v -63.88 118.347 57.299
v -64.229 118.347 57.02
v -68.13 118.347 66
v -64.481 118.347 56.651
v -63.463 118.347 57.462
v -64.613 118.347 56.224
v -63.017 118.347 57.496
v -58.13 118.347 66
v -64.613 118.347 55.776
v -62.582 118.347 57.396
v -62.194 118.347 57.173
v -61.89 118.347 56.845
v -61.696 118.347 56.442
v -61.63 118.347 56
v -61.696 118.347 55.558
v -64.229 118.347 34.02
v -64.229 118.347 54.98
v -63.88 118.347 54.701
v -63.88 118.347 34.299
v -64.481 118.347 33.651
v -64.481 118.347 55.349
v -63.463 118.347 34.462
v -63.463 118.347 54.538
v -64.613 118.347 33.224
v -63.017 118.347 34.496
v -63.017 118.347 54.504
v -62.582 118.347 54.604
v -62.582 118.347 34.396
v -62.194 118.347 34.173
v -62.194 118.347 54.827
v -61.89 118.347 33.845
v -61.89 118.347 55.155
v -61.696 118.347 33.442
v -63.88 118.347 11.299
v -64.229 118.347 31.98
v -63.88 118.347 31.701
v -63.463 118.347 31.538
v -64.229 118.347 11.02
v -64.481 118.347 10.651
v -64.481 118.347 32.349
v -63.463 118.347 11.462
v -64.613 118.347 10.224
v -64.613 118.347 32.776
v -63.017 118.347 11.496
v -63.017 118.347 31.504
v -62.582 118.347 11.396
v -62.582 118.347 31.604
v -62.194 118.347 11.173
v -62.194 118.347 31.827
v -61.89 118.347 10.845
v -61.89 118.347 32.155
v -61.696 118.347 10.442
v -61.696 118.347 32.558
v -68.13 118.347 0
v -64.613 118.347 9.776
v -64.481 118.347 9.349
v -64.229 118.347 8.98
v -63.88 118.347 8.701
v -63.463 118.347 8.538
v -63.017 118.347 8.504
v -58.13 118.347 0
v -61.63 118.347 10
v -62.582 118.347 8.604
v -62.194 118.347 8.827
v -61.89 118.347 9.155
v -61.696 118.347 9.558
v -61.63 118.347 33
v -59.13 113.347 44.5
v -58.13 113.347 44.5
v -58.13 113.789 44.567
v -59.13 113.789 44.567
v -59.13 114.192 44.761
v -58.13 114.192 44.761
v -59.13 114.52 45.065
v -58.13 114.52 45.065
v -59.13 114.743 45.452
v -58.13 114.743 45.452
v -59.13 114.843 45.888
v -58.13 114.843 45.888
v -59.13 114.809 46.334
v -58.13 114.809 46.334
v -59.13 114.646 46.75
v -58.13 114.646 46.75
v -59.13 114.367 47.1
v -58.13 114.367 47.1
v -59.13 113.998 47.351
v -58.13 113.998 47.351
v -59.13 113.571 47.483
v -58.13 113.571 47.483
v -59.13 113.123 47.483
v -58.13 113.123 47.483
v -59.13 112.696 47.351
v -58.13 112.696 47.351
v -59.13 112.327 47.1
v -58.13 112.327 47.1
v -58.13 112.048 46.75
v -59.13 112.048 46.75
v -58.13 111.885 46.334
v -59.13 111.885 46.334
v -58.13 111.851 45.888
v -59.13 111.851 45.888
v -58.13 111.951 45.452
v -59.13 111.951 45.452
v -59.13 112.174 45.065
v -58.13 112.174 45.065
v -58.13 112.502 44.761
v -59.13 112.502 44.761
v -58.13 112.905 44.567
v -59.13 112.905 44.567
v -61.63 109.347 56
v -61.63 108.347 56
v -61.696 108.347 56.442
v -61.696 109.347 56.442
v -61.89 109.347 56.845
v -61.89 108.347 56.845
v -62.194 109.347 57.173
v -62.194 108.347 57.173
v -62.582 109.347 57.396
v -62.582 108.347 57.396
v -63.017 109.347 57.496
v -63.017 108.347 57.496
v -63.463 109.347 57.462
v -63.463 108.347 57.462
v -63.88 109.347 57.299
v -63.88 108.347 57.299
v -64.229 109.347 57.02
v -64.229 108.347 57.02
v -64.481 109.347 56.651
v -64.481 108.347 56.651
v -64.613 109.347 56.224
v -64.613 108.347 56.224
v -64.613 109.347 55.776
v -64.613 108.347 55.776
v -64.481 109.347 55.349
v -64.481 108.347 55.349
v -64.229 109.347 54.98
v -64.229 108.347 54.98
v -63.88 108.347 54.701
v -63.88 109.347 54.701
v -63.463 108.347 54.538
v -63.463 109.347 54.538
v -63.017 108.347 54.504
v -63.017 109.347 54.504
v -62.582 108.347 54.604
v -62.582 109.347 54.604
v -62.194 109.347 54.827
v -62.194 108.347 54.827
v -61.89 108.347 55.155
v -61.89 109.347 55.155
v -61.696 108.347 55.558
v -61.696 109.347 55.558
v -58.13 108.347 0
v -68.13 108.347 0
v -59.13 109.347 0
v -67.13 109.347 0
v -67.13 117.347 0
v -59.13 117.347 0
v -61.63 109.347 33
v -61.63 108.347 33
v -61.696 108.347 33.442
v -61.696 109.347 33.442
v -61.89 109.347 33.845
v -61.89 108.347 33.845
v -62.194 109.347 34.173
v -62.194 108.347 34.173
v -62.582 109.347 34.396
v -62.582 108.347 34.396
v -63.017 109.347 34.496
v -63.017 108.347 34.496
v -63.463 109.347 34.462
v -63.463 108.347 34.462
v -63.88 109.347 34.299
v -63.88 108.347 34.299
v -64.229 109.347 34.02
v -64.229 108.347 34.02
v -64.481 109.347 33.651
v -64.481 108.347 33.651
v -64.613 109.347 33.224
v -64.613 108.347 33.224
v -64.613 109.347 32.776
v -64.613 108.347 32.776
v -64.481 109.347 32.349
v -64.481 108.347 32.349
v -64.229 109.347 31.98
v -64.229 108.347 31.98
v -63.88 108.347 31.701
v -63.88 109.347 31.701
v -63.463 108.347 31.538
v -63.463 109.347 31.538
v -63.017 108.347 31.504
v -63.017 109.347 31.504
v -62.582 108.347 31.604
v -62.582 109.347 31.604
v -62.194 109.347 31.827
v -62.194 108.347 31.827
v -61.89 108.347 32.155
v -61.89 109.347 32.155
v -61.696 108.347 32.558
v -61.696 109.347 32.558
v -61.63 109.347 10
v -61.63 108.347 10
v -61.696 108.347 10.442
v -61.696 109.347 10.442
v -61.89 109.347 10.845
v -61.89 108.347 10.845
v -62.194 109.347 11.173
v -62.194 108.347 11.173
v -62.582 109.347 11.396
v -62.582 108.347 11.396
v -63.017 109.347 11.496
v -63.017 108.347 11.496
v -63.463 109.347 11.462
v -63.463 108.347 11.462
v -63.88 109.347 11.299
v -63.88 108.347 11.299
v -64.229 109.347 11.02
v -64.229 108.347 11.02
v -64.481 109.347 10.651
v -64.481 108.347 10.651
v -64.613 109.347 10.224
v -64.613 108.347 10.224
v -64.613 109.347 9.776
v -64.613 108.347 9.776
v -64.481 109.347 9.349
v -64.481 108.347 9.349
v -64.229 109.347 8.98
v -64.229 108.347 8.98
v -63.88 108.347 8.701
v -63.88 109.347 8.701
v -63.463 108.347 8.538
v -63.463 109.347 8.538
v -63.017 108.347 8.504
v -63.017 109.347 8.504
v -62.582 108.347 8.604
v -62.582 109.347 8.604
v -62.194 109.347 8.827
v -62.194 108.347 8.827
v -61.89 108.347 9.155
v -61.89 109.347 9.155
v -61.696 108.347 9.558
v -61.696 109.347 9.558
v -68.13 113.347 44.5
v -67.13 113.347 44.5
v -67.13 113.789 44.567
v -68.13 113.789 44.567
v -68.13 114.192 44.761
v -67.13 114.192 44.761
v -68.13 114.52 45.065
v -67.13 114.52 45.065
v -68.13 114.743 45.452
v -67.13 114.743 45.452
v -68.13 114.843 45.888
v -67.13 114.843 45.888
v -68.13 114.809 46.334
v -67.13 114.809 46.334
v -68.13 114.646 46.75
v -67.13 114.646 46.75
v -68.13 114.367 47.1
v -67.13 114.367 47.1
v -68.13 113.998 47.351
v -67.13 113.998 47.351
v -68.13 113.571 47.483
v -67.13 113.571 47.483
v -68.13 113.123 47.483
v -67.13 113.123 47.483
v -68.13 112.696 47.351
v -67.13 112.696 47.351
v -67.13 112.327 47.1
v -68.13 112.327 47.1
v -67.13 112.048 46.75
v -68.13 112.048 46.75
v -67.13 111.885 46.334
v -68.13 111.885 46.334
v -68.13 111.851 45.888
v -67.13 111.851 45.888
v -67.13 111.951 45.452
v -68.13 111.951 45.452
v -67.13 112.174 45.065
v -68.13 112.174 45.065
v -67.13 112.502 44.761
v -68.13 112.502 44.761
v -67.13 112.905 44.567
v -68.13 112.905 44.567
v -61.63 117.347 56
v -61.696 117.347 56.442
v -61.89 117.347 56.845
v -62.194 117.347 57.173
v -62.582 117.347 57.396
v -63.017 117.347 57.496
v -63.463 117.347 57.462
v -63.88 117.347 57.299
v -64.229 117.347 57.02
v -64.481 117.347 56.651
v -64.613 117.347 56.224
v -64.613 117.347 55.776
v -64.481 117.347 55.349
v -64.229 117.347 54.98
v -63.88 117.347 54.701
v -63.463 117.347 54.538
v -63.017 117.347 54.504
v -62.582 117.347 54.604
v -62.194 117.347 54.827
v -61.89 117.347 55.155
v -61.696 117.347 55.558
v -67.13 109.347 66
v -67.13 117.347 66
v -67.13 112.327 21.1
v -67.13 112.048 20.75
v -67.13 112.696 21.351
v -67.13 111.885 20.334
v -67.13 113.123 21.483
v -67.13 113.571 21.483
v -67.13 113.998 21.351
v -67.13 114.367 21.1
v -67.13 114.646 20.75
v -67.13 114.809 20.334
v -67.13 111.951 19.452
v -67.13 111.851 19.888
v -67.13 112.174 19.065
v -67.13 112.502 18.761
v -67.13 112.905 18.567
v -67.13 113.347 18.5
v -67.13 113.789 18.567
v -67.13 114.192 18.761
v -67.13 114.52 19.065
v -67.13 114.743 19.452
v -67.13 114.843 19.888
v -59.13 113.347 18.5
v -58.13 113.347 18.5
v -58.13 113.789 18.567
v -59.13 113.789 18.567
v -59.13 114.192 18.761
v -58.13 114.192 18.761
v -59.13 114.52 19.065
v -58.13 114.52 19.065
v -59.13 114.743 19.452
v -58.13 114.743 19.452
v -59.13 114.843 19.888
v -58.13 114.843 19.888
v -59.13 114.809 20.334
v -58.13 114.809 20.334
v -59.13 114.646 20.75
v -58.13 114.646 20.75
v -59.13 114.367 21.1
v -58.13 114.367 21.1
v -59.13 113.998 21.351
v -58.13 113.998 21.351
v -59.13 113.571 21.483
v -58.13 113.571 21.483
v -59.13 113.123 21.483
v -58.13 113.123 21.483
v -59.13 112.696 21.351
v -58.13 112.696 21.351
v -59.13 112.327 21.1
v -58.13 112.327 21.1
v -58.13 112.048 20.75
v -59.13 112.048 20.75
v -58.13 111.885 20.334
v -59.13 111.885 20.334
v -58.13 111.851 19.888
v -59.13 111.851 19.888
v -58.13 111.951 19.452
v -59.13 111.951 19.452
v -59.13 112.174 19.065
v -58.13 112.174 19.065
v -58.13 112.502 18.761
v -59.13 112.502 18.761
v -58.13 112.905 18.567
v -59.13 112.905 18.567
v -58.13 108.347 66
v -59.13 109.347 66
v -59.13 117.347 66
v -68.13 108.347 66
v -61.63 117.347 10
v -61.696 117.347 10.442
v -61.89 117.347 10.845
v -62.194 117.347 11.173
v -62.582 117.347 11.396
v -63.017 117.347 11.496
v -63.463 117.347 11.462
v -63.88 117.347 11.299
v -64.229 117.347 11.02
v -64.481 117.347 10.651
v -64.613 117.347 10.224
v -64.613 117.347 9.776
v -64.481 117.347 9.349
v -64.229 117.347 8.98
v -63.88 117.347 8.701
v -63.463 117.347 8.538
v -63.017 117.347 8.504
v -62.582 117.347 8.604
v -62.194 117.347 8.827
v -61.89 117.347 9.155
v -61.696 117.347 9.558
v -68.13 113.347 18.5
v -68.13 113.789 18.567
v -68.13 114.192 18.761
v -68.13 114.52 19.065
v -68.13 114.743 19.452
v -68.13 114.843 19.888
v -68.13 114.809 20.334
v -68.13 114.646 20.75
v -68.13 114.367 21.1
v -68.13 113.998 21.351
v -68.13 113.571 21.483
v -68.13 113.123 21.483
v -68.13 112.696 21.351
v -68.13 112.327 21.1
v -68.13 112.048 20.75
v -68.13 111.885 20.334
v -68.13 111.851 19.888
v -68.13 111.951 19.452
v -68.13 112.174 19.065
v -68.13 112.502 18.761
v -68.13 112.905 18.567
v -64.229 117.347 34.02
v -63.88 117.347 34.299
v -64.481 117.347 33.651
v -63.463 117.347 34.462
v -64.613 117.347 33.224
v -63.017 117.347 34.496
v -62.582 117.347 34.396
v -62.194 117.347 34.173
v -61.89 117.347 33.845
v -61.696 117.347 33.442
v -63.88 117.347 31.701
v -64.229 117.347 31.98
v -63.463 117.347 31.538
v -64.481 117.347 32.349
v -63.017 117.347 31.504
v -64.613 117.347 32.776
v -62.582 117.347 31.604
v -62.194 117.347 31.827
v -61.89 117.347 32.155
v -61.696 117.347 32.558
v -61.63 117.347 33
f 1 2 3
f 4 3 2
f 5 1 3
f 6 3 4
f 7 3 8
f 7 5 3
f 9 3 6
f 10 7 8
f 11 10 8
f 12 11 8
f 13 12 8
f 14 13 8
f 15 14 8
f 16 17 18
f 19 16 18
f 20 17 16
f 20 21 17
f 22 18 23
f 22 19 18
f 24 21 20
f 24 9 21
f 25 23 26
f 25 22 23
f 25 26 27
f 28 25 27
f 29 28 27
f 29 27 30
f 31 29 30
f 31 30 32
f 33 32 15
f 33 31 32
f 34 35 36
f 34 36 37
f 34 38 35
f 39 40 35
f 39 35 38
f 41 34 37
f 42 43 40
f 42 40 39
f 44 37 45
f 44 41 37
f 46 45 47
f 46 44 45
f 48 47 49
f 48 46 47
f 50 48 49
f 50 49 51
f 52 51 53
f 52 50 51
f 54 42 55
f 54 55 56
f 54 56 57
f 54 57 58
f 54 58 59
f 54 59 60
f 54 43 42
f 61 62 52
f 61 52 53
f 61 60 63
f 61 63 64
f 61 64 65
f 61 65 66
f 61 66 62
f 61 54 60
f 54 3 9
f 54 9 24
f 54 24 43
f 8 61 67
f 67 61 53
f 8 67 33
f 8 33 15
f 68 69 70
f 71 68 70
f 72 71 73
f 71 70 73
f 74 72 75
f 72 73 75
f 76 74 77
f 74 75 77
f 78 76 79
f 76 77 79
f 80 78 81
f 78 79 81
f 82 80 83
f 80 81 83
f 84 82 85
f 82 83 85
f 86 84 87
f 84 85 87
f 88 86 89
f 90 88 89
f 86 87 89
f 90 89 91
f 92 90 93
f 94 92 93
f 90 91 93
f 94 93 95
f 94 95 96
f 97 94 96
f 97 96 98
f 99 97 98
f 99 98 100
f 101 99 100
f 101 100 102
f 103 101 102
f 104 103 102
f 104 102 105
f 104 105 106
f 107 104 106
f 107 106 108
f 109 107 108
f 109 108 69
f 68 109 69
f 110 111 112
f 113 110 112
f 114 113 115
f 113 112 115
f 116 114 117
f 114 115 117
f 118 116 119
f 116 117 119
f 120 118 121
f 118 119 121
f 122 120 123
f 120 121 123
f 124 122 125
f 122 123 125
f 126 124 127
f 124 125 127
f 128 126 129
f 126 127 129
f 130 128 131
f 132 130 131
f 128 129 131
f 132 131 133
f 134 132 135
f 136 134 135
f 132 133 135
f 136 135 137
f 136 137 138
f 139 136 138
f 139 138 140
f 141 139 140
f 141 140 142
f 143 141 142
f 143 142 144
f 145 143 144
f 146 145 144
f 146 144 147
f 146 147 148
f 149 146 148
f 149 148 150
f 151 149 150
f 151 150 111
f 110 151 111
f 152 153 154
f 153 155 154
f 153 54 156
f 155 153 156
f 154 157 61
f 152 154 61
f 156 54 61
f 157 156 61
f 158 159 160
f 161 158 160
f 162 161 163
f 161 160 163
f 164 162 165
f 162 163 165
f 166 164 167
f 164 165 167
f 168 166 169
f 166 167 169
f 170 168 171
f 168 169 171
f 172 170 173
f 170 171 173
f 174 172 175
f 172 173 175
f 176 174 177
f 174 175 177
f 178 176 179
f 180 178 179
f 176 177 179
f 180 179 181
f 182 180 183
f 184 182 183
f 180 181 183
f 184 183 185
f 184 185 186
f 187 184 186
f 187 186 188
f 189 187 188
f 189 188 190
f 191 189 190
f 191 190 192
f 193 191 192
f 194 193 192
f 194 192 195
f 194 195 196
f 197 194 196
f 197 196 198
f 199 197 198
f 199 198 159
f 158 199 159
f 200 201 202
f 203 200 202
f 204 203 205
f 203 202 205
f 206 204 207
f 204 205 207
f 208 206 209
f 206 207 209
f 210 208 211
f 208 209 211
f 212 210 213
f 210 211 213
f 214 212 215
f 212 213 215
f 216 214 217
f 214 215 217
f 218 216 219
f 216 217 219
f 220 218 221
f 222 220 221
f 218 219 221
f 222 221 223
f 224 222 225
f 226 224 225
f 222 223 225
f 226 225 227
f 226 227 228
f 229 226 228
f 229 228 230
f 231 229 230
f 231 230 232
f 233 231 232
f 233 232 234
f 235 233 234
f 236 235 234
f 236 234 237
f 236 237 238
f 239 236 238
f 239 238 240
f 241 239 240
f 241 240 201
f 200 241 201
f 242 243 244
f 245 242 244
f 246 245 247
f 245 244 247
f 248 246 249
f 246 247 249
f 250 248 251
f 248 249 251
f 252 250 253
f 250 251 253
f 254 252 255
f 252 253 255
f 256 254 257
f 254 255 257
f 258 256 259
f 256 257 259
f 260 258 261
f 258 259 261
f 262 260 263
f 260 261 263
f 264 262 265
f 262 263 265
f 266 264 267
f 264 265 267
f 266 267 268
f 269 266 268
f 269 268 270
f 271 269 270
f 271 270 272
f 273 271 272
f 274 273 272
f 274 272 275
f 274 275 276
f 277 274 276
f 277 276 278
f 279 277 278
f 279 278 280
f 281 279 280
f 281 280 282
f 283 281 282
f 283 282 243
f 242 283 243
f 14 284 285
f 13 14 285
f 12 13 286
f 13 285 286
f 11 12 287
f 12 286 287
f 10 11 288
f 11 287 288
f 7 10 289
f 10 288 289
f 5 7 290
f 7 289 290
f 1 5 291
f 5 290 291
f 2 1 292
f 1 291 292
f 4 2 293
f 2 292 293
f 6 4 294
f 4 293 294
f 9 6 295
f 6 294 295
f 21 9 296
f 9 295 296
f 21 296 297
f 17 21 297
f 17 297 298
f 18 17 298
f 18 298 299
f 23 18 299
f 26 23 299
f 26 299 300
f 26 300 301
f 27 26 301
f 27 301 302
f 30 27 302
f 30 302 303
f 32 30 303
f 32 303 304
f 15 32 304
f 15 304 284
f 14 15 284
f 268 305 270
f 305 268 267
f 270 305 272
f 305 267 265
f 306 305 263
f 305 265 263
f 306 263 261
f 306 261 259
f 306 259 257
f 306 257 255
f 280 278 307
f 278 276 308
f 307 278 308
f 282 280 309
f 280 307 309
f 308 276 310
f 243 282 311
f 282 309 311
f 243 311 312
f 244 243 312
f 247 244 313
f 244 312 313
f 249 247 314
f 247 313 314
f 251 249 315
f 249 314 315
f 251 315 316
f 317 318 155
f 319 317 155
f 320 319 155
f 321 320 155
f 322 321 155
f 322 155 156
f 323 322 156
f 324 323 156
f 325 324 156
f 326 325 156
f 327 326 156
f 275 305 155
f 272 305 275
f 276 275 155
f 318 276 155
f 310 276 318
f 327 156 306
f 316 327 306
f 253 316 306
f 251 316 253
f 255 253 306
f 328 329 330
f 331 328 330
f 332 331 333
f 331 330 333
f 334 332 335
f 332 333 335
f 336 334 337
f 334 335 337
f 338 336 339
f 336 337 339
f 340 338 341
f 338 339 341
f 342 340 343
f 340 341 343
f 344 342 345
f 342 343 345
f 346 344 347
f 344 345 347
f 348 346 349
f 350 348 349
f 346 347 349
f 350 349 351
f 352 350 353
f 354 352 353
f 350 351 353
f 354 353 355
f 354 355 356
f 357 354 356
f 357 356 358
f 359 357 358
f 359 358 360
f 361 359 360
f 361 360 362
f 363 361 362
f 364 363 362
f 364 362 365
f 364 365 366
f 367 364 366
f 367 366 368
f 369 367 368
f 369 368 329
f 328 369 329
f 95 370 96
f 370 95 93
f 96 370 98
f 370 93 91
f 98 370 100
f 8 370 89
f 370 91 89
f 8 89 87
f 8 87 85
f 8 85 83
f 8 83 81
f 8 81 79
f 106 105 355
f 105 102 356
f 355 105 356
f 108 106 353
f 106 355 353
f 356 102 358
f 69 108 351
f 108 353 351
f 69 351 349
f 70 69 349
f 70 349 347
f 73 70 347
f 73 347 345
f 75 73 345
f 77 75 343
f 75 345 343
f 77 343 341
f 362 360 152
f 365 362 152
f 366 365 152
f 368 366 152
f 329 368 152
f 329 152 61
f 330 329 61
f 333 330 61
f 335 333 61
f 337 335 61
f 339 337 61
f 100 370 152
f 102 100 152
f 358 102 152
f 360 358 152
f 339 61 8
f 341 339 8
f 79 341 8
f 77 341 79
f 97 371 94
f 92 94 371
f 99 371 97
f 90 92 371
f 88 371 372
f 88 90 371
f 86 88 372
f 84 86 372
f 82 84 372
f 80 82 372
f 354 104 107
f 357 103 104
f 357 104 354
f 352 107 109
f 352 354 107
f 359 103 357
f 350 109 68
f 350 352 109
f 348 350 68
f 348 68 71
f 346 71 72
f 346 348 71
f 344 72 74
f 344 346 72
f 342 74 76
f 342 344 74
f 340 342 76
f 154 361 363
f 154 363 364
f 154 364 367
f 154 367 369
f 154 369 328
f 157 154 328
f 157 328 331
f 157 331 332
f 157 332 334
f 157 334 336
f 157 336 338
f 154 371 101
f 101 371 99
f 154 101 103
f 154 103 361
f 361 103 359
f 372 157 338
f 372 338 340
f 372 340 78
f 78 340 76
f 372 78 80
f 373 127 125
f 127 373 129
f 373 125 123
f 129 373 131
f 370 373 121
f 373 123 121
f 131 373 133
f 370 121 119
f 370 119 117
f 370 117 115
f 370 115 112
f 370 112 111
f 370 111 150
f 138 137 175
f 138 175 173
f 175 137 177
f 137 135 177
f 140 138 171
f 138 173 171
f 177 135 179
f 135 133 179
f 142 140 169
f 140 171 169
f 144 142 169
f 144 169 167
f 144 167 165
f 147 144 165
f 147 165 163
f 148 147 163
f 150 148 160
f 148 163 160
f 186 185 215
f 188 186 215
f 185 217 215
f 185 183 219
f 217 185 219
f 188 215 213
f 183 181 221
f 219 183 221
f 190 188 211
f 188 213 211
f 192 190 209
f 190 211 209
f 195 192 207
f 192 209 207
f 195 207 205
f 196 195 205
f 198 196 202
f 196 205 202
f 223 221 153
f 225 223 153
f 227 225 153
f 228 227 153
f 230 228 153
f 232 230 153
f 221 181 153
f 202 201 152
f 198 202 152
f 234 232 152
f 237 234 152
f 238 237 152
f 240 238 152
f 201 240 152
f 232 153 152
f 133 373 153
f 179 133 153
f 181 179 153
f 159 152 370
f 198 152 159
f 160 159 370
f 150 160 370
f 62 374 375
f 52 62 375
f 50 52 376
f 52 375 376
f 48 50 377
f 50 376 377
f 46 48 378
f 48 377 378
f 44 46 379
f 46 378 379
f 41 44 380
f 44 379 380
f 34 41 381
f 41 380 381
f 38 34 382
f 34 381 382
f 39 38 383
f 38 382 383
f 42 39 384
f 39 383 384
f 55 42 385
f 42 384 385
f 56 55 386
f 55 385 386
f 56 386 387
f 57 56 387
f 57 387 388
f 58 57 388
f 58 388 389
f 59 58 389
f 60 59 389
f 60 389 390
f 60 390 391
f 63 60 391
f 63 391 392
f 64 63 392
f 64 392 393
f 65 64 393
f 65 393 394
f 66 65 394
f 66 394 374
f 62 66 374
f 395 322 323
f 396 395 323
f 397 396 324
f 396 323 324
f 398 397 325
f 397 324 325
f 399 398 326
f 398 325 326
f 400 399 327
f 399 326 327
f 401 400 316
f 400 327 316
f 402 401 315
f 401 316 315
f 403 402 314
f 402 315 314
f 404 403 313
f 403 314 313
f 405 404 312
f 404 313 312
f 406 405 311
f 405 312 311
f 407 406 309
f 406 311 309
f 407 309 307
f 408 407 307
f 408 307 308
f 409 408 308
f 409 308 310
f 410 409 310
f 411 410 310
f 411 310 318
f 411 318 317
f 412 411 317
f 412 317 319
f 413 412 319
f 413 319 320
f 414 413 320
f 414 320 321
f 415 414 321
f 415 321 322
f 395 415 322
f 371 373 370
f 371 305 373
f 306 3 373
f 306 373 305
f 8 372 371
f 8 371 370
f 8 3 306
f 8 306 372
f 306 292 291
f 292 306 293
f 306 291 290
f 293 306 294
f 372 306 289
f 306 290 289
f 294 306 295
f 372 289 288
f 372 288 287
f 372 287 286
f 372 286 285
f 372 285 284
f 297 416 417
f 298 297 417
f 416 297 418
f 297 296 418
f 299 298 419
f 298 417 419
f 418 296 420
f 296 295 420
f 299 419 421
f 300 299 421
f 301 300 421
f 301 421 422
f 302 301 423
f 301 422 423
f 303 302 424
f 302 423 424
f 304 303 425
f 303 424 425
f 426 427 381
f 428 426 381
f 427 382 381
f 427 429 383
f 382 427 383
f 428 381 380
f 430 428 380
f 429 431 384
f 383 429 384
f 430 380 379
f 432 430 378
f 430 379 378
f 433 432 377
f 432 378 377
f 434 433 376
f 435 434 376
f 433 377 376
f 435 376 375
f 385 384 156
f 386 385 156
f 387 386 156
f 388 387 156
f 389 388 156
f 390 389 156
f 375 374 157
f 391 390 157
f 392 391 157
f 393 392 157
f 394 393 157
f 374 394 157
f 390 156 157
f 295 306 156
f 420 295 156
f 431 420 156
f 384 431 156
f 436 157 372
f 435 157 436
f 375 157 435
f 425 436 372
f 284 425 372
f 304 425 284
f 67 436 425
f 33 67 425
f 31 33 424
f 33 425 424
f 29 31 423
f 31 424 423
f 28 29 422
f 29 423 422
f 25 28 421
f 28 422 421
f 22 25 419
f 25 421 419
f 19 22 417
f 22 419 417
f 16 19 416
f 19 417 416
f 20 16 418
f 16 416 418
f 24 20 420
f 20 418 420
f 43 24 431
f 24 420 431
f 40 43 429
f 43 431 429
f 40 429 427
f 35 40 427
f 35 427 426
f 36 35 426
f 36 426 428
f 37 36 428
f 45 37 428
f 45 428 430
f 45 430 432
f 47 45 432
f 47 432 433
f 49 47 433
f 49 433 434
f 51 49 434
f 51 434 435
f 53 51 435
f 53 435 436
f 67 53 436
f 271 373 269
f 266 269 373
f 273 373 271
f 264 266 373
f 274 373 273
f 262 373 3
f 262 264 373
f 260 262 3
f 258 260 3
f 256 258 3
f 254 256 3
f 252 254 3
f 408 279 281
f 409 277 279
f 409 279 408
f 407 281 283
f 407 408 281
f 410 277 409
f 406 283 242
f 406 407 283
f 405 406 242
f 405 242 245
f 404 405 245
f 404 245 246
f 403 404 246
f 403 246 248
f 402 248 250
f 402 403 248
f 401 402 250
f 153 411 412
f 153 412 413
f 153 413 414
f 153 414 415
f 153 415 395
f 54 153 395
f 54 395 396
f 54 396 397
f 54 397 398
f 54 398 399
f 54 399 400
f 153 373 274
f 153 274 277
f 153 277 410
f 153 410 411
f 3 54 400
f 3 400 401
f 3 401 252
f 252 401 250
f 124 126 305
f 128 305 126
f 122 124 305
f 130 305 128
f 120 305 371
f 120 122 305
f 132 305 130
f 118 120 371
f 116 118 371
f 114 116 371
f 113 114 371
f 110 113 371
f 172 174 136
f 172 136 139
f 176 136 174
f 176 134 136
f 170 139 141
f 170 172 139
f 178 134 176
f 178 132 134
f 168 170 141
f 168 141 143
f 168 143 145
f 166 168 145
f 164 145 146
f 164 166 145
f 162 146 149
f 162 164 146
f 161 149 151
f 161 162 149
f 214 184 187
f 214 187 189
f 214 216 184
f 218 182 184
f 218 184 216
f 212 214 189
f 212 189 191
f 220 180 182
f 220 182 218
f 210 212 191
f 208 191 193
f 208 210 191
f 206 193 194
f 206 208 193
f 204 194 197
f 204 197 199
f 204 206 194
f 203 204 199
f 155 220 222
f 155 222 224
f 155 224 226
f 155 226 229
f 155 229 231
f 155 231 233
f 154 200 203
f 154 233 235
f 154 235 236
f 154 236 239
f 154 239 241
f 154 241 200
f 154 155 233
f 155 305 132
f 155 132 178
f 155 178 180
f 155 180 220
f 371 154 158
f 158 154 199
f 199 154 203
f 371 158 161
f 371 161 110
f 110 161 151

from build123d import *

# Parameters (mm, degrees)
SKETCH_1_W          = 10
SKETCH_1_H          = 10
SKETCH_1_W_2        = 8
SKETCH_1_H_2        = 8
EXTRUDE_1_DEPTH     = 66
SKETCH_2_R          = 1.5
CUT_EXTRUDE_1_DEPTH = 11
SKETCH_3_R          = 1.5
CUT_EXTRUDE_2_DEPTH = 11


with BuildPart() as part:
    # 草图1 → 拉伸-薄壁1 (new body)
    with BuildSketch(Plane.XY):
        with Locations((-63.129584871, 113.346996024)):
            Rectangle(SKETCH_1_W, SKETCH_1_H)
        with Locations((-63.129584871, 113.346996024)):
            Rectangle(SKETCH_1_W_2, SKETCH_1_H_2, mode=Mode.SUBTRACT)
    extrude(amount=EXTRUDE_1_DEPTH)

    # 草图2 → 切除-拉伸1 (cut, through all)
    with BuildSketch(Plane(origin=(-58.129584871, 0, 0), x_dir=(0, 0, -1), z_dir=(1, 0, 0))):
        with Locations((-20, 113.346996024)):
            Circle(SKETCH_2_R)
        with Locations((-46, 113.346996024)):
            Circle(SKETCH_2_R)
    extrude(amount=-CUT_EXTRUDE_1_DEPTH, mode=Mode.SUBTRACT)

    # 草图3 → 切除-拉伸2 (cut, through all)
    with BuildSketch(Plane.XZ.offset(-108.346996024)):
        with Locations((-63.129584871, 10)):
            Circle(SKETCH_3_R)
        with Locations((-63.129584871, 56)):
            Circle(SKETCH_3_R)
        with Locations((-63.129584871, 33)):
            Circle(SKETCH_3_R)
    extrude(amount=-CUT_EXTRUDE_2_DEPTH, mode=Mode.SUBTRACT)


solid = part.part
